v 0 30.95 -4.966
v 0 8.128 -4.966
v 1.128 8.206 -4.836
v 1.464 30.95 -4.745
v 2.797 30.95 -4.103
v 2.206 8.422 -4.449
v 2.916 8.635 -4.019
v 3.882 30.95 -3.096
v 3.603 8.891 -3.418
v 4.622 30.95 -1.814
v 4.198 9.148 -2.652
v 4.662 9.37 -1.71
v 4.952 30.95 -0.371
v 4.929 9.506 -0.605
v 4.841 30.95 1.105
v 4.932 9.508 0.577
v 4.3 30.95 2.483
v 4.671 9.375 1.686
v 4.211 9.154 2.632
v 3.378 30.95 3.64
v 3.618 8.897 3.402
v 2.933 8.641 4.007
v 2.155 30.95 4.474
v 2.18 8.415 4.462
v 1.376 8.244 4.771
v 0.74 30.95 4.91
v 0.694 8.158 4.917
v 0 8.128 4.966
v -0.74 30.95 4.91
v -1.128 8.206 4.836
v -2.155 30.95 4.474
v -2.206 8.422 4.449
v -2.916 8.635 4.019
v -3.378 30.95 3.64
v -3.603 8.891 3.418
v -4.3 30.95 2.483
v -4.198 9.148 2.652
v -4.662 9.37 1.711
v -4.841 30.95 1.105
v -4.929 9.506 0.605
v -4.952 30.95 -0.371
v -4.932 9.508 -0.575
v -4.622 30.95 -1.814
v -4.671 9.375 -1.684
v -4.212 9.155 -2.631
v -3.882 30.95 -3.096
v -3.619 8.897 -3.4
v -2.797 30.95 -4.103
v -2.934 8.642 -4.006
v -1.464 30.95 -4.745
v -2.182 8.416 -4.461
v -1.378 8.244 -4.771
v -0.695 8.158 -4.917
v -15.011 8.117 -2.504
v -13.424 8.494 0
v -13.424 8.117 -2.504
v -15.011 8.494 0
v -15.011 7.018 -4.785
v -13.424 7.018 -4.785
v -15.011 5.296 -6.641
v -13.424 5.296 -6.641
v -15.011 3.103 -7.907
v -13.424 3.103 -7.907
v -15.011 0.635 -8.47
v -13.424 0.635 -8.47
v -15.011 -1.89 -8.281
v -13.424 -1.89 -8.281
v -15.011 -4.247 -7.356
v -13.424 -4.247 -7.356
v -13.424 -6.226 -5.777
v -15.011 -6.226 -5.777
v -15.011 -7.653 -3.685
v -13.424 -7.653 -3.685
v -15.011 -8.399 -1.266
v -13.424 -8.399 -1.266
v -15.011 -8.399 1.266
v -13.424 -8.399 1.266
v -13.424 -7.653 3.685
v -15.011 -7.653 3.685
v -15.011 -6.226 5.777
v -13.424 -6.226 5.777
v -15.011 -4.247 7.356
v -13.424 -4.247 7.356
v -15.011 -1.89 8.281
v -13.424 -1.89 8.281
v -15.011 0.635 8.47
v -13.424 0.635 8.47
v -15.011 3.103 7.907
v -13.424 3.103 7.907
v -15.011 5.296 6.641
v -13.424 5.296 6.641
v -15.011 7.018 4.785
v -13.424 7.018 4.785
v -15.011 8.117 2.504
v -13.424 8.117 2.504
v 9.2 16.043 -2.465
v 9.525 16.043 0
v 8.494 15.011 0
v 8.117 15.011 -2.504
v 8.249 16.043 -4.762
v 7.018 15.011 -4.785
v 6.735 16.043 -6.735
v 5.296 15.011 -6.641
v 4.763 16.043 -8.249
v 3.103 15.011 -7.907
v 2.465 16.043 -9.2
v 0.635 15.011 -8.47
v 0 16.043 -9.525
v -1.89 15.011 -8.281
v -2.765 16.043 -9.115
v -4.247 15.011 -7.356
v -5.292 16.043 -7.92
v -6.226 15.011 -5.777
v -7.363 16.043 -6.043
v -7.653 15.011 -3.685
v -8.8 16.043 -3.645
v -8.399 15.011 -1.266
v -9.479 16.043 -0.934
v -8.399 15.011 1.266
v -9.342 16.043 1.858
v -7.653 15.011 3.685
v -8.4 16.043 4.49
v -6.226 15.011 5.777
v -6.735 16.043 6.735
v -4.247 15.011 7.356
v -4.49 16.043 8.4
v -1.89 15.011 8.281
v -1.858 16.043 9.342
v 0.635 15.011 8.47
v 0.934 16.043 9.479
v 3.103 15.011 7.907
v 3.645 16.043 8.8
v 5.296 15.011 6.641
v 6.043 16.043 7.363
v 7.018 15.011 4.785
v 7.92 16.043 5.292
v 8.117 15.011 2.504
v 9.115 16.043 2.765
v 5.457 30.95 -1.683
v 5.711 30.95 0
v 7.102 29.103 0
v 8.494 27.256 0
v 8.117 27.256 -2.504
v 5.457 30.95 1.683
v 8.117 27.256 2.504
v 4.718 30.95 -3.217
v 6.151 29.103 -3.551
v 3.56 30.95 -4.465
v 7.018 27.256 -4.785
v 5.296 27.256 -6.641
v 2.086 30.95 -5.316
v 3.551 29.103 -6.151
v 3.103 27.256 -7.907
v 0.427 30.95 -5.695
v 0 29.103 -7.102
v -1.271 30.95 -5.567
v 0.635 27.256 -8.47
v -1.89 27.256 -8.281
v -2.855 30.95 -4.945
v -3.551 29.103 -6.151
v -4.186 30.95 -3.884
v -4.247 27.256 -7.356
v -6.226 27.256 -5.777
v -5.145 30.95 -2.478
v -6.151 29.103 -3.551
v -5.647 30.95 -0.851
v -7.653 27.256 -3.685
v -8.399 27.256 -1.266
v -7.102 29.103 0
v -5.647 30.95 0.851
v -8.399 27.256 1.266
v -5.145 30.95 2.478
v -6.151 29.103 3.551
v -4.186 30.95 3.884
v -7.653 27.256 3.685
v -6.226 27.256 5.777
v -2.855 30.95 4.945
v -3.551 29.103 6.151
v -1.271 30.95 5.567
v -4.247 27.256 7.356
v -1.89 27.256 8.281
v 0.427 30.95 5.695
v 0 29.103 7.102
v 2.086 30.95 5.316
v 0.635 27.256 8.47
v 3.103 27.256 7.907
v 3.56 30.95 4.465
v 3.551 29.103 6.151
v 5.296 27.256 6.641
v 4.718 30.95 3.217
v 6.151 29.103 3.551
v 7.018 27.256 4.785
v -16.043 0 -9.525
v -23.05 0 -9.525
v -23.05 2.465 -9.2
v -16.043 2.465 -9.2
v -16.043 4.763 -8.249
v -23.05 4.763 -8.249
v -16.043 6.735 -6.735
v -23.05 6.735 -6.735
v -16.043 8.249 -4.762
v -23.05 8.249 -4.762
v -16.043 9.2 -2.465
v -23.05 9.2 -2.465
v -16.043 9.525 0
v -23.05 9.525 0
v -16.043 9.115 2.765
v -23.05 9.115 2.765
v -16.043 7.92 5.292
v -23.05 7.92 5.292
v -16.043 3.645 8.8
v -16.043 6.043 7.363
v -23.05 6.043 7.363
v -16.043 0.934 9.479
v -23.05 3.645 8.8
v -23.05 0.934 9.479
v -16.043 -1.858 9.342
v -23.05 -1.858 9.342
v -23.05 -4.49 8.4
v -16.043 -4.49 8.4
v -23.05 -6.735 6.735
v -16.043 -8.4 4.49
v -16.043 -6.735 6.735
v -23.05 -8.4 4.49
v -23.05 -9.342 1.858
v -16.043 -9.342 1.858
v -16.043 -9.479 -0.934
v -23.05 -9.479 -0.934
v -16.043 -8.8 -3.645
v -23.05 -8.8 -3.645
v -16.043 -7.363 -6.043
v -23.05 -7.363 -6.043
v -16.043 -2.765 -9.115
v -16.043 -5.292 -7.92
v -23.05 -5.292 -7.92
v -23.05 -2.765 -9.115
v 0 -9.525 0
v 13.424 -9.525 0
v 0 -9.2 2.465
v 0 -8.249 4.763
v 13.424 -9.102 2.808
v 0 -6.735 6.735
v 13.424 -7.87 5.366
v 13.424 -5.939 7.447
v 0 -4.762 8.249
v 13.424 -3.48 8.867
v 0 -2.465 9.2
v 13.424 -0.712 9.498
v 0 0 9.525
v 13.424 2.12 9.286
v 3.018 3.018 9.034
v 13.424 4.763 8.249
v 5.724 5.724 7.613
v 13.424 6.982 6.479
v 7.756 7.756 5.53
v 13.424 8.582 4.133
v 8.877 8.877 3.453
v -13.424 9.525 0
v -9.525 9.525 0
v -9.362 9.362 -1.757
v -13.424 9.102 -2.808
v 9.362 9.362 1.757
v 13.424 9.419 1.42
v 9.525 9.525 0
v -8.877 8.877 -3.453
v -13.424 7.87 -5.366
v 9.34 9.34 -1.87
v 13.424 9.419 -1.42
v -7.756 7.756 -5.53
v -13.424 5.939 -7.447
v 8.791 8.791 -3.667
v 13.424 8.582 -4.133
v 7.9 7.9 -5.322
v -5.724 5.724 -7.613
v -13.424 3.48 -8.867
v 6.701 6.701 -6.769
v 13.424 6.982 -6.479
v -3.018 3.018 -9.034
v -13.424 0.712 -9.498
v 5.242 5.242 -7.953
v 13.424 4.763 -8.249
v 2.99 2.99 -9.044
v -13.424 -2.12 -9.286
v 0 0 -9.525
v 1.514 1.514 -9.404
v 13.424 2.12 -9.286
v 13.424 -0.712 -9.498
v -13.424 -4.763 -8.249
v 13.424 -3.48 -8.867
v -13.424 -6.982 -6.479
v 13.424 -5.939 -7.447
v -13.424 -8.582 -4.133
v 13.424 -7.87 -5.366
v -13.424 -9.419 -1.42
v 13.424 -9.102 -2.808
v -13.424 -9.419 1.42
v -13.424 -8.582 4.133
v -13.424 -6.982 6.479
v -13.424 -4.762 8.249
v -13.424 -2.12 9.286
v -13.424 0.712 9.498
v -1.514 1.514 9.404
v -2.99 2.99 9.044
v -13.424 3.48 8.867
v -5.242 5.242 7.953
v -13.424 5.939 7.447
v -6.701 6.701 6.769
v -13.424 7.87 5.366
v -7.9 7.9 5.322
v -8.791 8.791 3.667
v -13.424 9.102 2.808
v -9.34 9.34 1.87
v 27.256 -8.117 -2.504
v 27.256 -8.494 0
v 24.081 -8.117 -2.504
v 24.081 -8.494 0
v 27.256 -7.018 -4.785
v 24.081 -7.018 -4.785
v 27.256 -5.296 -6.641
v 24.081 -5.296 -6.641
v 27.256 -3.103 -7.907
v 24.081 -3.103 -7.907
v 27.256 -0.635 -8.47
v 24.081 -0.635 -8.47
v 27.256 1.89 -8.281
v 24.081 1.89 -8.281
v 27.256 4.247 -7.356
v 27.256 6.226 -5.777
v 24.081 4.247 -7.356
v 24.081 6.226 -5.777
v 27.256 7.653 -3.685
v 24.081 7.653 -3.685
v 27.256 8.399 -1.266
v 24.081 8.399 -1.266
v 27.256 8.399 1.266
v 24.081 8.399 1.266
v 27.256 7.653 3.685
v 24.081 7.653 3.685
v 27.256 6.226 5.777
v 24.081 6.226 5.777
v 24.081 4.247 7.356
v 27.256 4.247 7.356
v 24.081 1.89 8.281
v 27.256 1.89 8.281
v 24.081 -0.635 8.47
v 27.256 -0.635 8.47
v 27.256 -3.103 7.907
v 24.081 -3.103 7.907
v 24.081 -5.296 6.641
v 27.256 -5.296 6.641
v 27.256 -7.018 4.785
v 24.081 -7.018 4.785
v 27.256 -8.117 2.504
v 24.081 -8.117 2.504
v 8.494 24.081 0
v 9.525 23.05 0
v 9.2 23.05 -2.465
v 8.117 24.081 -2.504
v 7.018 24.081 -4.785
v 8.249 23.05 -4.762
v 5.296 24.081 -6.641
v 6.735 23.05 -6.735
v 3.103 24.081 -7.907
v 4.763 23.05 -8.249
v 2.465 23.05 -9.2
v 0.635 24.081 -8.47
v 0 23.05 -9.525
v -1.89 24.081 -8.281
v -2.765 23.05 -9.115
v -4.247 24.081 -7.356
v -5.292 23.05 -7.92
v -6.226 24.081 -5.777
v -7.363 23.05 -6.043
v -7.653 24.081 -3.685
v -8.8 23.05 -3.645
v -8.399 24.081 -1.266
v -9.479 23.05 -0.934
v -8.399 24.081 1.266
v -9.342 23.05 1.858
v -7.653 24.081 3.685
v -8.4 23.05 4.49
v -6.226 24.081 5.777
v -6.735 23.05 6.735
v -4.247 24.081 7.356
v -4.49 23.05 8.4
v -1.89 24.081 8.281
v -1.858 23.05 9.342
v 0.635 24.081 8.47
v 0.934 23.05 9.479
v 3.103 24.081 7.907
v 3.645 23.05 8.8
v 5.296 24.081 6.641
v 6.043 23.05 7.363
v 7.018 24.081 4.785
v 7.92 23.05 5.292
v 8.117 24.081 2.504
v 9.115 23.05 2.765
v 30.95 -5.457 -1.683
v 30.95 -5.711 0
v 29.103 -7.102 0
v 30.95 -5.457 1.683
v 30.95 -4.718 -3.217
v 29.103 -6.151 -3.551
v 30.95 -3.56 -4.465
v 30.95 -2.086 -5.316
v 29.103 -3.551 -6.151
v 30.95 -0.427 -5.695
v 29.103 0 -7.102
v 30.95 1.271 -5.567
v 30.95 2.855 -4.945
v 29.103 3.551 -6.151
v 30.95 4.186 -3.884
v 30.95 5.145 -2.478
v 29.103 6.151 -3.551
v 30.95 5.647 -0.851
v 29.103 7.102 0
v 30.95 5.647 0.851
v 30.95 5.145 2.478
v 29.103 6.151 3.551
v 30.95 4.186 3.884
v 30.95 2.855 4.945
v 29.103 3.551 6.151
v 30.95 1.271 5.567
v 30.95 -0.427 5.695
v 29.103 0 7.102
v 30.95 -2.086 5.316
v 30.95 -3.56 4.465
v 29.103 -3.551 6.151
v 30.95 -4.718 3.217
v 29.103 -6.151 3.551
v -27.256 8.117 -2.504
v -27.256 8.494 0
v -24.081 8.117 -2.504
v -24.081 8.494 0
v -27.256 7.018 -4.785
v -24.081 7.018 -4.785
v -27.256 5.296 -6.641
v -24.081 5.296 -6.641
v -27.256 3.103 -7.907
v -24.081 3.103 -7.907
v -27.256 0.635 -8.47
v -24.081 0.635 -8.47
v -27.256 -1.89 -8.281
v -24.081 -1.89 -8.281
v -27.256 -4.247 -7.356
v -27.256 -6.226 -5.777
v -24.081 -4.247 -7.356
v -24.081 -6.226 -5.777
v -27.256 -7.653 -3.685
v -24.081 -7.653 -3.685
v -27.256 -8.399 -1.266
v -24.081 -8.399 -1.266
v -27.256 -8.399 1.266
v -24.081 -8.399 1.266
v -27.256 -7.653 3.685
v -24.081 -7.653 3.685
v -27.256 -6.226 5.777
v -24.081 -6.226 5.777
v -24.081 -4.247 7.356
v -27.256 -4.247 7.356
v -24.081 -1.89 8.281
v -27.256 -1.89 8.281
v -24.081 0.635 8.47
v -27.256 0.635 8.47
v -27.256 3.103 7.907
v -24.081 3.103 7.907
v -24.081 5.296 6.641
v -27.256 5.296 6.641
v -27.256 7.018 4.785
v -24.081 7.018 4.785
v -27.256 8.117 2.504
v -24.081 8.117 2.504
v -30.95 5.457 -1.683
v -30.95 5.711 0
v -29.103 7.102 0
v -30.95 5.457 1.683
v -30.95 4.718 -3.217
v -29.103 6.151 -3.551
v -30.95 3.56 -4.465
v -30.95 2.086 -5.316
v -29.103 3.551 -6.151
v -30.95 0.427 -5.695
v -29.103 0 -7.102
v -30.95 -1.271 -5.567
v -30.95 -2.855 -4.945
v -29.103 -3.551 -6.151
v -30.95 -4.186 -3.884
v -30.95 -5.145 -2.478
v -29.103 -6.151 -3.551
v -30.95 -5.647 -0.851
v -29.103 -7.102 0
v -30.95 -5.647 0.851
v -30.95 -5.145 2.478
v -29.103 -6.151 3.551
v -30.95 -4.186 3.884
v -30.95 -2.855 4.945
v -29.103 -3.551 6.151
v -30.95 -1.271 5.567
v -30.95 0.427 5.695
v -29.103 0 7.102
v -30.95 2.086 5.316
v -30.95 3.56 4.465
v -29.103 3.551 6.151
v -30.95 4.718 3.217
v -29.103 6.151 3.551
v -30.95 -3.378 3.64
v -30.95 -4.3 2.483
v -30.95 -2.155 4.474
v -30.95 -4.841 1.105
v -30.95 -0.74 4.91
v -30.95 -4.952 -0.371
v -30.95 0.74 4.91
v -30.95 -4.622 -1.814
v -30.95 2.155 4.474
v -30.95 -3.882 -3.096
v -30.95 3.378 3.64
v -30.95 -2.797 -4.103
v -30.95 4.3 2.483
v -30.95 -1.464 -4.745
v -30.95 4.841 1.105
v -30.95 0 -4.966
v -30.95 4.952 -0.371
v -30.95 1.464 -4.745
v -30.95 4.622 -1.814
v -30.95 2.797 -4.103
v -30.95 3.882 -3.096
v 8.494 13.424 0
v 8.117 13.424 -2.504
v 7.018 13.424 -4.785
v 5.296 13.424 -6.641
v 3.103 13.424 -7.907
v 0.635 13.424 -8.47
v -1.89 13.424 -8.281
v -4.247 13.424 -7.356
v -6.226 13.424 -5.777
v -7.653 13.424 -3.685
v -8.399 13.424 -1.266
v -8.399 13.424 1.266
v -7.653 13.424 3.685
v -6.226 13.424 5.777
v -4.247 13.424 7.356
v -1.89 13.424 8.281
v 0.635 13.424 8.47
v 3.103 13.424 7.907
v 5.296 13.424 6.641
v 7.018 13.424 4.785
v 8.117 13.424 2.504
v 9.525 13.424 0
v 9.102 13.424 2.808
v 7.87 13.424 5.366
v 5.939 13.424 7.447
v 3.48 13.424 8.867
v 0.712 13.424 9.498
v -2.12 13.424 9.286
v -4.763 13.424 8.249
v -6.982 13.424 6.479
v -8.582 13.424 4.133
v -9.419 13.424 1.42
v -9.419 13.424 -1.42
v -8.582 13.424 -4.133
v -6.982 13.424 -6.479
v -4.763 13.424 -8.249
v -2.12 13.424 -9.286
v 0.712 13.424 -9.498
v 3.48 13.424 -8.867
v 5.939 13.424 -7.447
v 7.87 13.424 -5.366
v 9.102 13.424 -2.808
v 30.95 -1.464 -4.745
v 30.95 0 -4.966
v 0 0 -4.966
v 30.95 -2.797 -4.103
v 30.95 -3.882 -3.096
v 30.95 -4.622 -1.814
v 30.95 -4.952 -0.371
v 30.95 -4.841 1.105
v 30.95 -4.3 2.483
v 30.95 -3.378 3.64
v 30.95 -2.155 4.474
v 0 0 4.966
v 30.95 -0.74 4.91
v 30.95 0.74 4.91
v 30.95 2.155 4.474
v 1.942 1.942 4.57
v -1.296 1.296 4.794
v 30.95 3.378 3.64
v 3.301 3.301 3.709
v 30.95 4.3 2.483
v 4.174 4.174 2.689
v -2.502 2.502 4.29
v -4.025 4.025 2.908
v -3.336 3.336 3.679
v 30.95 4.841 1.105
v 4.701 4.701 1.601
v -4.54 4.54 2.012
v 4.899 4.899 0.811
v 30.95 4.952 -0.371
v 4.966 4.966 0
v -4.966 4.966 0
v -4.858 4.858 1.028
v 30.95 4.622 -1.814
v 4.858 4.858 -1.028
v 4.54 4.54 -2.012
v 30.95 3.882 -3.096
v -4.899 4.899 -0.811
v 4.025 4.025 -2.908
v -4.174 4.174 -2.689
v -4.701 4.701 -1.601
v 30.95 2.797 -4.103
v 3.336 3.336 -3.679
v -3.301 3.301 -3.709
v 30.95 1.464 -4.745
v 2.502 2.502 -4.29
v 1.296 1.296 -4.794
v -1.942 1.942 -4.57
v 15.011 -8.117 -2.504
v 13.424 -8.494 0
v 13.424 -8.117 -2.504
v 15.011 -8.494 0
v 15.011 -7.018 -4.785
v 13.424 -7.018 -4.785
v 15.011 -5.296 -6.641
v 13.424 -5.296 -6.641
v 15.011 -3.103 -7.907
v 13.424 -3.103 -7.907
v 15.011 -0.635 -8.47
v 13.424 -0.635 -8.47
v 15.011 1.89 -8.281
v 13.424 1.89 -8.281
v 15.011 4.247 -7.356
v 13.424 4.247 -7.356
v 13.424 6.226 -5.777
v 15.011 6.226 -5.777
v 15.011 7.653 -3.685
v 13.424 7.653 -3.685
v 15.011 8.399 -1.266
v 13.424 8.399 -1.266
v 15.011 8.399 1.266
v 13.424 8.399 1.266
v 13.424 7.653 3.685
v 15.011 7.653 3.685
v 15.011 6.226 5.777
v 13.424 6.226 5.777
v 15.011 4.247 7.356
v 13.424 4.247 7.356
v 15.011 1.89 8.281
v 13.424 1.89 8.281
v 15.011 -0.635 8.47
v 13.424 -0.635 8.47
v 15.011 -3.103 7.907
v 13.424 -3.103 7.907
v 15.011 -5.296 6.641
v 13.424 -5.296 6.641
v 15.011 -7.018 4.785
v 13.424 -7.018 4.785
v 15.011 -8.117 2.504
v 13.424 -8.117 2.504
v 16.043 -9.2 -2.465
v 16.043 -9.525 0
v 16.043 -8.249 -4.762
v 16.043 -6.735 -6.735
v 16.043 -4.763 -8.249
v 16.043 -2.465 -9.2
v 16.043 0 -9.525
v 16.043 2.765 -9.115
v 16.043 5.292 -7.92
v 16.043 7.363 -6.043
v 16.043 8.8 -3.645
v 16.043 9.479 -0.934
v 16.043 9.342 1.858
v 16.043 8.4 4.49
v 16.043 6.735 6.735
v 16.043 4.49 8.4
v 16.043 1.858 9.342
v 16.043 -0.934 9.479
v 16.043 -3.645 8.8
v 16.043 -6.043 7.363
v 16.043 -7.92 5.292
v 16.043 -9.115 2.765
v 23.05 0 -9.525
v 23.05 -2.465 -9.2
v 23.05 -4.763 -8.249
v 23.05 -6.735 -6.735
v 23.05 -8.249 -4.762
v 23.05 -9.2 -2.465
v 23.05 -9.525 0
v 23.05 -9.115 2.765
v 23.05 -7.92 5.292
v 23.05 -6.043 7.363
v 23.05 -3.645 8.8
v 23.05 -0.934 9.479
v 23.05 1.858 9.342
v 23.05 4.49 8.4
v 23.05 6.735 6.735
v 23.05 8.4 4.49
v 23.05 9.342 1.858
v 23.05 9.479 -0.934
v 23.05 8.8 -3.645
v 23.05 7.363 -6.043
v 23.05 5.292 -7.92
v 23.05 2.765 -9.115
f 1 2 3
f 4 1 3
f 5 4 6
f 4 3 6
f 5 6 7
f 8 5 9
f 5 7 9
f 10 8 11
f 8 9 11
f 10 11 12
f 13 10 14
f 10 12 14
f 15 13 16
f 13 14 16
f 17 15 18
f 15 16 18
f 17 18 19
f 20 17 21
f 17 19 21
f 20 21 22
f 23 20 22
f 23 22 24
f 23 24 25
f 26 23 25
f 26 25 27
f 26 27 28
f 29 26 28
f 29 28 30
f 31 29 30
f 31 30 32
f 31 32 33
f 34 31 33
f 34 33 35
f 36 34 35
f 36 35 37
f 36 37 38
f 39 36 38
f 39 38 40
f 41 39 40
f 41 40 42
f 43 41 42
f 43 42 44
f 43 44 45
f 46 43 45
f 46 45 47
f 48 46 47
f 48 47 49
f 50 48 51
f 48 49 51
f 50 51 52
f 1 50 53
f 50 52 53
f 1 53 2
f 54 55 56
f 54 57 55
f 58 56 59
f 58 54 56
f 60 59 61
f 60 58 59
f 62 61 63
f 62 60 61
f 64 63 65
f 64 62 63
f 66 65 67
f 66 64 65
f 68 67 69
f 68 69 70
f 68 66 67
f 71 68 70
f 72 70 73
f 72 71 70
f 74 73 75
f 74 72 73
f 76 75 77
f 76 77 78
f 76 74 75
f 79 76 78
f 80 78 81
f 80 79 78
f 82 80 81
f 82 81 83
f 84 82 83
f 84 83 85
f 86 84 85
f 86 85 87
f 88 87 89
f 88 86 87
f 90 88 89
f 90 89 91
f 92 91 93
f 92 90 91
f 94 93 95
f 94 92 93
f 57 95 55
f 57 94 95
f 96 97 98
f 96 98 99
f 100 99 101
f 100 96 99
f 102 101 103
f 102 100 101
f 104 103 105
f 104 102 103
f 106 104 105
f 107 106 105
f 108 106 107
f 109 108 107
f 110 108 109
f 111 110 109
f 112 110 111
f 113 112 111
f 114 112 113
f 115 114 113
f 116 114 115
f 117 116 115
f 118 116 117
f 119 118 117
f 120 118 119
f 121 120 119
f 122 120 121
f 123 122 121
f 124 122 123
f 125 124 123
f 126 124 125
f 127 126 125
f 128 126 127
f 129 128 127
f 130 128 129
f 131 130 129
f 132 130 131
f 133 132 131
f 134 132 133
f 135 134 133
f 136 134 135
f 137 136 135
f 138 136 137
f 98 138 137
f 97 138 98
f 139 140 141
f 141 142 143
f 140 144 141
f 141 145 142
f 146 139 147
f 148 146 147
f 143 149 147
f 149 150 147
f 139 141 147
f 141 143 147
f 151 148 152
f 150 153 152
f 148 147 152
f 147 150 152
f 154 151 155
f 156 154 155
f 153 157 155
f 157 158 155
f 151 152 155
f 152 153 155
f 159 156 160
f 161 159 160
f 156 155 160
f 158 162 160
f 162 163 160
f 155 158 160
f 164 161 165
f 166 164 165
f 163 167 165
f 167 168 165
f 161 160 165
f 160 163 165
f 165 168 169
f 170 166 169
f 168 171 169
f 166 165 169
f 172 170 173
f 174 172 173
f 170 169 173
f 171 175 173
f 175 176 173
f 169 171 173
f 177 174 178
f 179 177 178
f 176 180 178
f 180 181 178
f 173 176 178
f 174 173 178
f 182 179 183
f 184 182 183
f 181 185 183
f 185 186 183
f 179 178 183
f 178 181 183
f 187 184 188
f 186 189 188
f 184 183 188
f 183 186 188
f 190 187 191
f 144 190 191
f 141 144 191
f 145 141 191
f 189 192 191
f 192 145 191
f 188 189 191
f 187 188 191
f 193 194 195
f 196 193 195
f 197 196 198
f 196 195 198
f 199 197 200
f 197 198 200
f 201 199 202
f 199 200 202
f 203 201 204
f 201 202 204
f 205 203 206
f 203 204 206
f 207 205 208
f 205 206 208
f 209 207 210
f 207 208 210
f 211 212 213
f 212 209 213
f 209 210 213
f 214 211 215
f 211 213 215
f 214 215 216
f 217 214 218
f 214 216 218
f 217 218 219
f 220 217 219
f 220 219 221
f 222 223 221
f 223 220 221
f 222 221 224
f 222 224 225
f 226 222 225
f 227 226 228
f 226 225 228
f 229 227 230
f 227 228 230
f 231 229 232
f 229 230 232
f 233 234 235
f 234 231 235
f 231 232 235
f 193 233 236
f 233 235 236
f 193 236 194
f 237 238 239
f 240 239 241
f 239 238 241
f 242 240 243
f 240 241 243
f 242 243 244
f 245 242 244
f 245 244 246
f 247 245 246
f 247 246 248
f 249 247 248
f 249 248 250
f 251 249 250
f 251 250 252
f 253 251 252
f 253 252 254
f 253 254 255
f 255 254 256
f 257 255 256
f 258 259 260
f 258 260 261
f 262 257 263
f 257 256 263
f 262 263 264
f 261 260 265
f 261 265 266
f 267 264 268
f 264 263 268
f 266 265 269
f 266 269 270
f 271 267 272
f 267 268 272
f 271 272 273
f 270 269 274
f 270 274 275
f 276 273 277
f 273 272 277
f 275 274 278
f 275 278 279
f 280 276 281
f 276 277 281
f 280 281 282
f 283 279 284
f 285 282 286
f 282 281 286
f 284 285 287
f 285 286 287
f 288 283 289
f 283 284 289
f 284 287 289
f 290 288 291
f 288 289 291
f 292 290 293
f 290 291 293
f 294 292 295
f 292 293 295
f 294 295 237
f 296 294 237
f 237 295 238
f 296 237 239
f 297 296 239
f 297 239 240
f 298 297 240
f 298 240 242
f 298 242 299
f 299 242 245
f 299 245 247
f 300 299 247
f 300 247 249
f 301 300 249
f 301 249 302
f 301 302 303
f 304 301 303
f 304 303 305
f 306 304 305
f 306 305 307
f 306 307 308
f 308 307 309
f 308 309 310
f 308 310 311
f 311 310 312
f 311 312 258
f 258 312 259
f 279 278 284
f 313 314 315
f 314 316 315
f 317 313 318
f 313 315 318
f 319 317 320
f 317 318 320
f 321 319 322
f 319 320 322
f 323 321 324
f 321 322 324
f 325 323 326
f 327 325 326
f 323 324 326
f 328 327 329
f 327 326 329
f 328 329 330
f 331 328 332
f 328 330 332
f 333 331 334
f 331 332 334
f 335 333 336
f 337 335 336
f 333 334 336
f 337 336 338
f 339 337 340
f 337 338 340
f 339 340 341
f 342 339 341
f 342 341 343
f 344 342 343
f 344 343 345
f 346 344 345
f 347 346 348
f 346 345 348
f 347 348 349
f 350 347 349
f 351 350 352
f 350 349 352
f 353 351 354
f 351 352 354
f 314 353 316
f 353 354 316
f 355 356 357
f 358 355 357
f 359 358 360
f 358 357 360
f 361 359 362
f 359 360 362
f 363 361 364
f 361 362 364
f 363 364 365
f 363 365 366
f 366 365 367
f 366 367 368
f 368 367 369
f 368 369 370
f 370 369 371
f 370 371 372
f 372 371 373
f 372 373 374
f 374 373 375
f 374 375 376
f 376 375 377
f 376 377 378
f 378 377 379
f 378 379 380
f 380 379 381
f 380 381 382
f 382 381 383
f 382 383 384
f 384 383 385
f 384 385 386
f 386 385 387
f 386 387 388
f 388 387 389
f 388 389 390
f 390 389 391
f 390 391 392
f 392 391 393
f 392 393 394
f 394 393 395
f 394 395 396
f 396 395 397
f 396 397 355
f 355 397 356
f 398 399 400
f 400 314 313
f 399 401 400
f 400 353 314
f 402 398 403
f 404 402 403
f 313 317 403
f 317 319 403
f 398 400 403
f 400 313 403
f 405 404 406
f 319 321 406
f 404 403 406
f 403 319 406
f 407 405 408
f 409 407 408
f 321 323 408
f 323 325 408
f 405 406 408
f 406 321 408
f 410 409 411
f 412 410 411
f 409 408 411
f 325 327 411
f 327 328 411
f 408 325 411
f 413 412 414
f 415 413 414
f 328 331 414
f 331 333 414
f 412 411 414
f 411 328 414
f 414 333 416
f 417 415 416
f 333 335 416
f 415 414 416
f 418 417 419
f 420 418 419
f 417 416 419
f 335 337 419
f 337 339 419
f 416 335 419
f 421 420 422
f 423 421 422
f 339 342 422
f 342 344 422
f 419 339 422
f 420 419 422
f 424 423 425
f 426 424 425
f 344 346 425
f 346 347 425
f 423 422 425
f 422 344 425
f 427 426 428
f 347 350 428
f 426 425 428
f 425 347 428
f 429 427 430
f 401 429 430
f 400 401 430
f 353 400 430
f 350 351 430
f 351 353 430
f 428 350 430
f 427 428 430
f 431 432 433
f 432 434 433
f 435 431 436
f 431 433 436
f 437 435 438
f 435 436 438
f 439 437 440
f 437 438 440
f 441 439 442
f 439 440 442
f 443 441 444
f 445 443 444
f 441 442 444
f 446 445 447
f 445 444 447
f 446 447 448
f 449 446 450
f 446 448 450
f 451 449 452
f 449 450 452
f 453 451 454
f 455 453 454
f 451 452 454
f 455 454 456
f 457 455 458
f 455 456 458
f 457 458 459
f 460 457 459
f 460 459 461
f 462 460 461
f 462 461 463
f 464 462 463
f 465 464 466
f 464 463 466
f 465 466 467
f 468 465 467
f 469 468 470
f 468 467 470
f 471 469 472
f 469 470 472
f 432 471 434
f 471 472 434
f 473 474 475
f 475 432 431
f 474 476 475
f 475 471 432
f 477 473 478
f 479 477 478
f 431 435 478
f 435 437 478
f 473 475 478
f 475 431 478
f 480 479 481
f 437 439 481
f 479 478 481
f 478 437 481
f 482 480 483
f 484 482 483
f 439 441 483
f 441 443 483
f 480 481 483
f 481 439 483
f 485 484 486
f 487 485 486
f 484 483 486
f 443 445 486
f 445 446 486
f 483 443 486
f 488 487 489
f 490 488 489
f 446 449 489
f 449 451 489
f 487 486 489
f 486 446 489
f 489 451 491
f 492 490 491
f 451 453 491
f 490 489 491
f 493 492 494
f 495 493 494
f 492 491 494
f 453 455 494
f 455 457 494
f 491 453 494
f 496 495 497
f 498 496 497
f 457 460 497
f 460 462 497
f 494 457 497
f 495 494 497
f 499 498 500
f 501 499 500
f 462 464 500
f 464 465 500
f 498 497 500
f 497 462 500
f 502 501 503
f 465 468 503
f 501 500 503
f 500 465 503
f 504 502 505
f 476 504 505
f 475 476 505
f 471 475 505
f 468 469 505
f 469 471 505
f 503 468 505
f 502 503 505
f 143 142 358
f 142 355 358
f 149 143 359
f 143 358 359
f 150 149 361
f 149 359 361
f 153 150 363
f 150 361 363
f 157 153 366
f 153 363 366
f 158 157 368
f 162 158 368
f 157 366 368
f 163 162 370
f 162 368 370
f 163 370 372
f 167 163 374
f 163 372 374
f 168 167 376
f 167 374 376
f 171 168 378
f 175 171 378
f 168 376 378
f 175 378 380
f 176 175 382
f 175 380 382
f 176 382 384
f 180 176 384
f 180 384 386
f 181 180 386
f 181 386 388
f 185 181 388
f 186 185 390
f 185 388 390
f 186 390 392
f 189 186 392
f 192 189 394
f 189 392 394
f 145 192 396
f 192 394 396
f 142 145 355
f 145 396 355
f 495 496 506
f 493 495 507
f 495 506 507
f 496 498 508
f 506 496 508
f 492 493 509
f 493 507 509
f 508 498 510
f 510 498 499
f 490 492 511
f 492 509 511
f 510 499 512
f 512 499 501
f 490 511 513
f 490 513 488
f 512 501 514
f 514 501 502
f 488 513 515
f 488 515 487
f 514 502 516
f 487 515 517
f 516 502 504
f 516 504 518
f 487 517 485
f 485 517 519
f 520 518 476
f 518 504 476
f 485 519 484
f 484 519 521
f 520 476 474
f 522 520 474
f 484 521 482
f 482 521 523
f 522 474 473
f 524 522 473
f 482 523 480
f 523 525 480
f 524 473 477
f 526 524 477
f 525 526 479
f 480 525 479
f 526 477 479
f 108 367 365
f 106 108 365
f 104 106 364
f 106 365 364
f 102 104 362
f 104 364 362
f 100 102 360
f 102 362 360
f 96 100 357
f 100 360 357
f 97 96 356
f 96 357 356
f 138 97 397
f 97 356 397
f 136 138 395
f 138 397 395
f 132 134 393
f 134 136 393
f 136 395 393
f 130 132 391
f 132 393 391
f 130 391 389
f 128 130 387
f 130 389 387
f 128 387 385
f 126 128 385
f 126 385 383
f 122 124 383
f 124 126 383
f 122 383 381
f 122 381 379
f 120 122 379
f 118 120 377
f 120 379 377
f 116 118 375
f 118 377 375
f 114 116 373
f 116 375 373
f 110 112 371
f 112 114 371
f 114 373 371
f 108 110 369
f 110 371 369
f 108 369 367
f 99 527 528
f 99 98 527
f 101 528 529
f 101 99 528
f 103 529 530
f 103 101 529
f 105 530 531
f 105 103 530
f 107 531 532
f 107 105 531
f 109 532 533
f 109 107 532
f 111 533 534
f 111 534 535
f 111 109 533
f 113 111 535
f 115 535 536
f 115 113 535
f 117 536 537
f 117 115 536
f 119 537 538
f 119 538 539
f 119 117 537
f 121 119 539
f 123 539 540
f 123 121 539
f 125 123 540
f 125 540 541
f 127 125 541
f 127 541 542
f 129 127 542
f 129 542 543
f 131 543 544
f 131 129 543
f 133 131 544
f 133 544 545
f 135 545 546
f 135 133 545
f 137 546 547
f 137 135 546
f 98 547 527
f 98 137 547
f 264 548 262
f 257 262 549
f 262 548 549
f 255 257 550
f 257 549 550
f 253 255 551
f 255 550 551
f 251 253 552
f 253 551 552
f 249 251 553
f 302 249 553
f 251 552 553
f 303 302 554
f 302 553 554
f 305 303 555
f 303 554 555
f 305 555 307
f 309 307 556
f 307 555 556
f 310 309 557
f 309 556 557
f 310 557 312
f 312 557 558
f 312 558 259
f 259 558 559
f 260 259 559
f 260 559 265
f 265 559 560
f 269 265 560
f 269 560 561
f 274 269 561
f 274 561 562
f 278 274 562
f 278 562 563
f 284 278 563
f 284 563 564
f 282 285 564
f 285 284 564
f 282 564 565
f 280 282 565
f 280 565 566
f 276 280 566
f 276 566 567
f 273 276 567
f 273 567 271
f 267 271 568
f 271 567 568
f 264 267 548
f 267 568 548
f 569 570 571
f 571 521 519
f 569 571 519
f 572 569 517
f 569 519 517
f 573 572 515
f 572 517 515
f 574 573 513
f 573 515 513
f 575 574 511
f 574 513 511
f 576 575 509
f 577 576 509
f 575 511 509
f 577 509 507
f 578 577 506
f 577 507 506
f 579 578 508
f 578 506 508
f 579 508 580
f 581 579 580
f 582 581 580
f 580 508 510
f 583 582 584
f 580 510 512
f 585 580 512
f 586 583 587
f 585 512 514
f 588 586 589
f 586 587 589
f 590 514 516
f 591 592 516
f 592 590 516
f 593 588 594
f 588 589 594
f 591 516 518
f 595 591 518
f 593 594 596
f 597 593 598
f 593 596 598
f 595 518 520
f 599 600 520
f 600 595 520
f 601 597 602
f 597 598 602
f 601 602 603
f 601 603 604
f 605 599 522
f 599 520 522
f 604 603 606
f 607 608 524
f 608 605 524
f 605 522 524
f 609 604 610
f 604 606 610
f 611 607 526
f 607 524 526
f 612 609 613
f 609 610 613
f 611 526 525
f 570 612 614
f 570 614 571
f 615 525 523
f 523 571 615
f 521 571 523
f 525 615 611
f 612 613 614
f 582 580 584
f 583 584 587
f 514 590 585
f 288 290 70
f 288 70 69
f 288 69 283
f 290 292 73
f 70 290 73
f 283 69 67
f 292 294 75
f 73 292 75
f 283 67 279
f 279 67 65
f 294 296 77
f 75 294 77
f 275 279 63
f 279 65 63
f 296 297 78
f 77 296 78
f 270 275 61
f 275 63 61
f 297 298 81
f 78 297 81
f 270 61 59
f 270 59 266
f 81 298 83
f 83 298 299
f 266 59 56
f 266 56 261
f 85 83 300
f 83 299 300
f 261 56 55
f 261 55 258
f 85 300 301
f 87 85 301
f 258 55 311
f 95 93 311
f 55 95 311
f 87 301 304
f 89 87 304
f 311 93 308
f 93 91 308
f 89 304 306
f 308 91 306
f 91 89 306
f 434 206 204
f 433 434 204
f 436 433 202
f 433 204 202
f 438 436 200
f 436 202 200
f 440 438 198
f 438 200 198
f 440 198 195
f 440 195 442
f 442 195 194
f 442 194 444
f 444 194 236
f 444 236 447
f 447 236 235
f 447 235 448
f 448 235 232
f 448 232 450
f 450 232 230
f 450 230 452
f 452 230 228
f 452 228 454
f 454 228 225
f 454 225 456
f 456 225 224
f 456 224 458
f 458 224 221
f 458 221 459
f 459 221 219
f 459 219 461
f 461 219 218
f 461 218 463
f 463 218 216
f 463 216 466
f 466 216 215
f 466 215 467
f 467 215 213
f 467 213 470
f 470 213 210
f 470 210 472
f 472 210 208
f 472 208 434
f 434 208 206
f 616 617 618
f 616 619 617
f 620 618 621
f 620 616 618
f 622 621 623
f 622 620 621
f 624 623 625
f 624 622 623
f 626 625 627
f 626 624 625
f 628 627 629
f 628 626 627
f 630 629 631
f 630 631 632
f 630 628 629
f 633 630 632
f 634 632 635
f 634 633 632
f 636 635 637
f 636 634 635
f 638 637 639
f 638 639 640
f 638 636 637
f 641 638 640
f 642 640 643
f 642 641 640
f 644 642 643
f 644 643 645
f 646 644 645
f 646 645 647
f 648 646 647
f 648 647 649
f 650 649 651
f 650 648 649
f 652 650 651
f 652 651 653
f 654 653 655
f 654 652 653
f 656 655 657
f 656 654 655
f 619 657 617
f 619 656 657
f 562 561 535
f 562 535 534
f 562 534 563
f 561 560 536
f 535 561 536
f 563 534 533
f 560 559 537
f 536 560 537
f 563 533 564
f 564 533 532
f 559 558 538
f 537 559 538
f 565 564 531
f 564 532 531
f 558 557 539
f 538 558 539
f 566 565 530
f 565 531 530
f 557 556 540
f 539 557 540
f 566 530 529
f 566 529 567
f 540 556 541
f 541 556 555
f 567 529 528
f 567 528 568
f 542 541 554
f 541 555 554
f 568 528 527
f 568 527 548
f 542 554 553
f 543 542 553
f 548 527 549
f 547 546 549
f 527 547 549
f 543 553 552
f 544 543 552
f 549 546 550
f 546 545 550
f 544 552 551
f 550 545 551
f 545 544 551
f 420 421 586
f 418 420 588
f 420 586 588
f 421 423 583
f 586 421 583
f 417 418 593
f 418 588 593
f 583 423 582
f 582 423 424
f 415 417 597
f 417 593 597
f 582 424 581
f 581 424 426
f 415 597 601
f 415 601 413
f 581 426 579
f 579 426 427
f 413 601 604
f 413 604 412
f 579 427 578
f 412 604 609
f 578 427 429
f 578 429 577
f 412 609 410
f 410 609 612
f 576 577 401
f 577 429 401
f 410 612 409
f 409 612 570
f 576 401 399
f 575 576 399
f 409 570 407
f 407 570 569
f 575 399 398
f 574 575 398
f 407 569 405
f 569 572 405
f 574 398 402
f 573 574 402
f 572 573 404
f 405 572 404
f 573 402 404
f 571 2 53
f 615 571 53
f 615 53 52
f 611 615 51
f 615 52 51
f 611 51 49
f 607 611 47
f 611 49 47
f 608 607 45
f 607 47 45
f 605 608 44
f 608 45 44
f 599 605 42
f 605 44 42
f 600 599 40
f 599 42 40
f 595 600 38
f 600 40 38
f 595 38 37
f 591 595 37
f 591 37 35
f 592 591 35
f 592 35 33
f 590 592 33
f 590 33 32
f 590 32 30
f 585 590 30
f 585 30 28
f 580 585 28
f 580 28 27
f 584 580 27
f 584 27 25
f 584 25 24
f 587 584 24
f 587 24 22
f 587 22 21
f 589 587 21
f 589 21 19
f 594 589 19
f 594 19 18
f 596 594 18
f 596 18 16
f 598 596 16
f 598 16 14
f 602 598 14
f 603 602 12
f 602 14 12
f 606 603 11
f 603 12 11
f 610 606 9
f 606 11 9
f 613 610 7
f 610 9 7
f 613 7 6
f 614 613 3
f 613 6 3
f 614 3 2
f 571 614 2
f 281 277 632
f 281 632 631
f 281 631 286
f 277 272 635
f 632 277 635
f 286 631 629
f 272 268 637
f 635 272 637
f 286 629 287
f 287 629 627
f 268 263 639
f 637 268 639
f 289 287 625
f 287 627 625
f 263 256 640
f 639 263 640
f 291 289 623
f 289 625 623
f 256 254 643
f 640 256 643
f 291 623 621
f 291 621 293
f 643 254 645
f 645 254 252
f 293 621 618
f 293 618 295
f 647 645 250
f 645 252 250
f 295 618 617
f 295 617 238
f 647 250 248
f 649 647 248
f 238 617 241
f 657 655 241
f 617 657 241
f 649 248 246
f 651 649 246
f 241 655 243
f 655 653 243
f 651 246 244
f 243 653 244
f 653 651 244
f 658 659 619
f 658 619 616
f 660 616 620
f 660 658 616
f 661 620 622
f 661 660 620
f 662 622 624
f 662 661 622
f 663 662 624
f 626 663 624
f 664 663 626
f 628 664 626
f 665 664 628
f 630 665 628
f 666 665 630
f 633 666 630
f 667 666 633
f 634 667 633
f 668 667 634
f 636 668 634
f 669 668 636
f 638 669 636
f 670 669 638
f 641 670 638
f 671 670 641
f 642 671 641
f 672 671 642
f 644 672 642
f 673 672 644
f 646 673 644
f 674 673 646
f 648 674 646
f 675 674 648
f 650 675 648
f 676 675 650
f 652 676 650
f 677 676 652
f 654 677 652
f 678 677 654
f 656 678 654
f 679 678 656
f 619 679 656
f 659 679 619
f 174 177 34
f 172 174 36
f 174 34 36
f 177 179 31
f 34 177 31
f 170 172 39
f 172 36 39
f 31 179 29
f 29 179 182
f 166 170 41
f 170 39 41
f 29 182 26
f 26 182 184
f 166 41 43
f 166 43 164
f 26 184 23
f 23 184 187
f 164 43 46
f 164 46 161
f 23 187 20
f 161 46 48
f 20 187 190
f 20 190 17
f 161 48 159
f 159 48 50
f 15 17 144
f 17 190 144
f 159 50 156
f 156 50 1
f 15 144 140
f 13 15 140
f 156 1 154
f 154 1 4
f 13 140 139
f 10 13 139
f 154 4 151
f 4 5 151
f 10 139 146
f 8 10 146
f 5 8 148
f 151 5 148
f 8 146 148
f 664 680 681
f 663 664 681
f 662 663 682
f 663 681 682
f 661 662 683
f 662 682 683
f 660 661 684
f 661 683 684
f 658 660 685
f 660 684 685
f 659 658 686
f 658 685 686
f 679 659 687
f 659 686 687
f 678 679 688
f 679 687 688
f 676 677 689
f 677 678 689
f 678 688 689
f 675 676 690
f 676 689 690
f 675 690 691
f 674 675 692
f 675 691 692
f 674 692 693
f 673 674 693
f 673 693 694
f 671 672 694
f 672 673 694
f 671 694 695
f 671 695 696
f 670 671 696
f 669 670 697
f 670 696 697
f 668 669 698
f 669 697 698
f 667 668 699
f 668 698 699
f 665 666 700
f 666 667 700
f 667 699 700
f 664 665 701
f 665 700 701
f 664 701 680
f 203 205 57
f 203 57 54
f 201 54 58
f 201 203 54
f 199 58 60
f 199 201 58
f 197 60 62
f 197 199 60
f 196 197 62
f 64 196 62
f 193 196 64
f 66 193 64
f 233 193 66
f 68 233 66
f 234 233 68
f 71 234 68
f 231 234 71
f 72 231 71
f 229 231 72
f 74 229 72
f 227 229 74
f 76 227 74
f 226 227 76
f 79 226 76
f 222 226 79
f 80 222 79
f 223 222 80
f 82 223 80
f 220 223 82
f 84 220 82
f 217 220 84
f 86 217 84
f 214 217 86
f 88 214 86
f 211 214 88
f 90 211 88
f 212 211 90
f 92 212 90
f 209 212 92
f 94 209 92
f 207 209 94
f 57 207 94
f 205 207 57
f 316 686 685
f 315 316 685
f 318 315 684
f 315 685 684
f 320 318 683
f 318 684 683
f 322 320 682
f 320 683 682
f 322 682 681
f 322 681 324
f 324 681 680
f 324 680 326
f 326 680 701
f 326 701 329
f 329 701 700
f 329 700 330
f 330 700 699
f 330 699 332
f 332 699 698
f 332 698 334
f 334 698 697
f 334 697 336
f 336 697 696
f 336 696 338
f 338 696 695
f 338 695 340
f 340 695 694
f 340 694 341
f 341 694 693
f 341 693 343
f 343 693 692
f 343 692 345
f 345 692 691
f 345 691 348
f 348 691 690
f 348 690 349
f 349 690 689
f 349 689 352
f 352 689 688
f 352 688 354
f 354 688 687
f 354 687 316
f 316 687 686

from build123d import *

# Parameters (mm, degrees)
SKETCH2_R           = 9.525
EXTRUDE1_DEPTH      = 17.526
SKETCH15_R          = 9.525
BOSS_EXTRUDE1_DEPTH = 13.4239
SKETCH16_R          = 4.9657
CUT_EXTRUDE1_DEPTH  = 34.754222847
CIRPATTERN1_COUNT   = 3
CIRPATTERN1_ANGLE   = 180
SKETCH17_R          = 4.9657
CUT_EXTRUDE2_DEPTH  = 70.858479622
CUT_EXTRUDE3_REACH  = 53.835
SKETCH18_R          = 4.9657


with BuildPart() as part:
    # Sketch2 → Extrude1 (new body)
    with BuildSketch(Plane(origin=(-30.9499, 0, 0), x_dir=(0, 0, -1), z_dir=(1, 0, 0))):
        Circle(SKETCH2_R)
    extrude(amount=EXTRUDE1_DEPTH)

    # Sketch5 → Cut-Revolve1 (revolve, cut)
    with BuildSketch(Plane.XY):
        Polygon((-27.256291687, 8.493888504), (-24.081291687, 8.493888504), (-23.050180191, 9.525), (-30.9499, 9.525), (-30.9499, 5.710555), align=None)
        Polygon((-13.4239, 8.493888504), (-15.0114, 8.493888504), (-16.042511496, 9.525), (-13.4239, 9.525), align=None)
    revolve(axis=Axis((0, 0, 0), (-1, 0, 0)), mode=Mode.SUBTRACT)

    # Sketch15 → Boss-Extrude1 (add)
    with BuildSketch(Plane(origin=(-13.4239, 0, 0), x_dir=(0, 0, -1), z_dir=(1, 0, 0))):
        with Locations(Location((0, 0, 0), (0, 0, 90))):
            Circle(SKETCH15_R)
    extrude(amount=BOSS_EXTRUDE1_DEPTH)

    # Sketch16 → Cut-Extrude1 (cut, through all)
    with BuildSketch(Plane(origin=(0, 0, 0), x_dir=(0, 0, -1), z_dir=(1, 0, 0))):
        Circle(SKETCH16_R)
    extrude(amount=-CUT_EXTRUDE1_DEPTH, mode=Mode.SUBTRACT)


with BuildPart() as cirpattern1_1:
    # CirPattern1: pattern copy
    add(part.part.rotate(Axis((0, 0, 0), (0, 0, -1)), 1 * CIRPATTERN1_ANGLE / (CIRPATTERN1_COUNT - 1)))

    # Sketch17 → Cut-Extrude2 (cut, through all)
    with BuildSketch(Plane.ZY.offset(30.9499)):
        with Locations(Location((0, 0, 0), (0, 0, 180))):
            Circle(SKETCH17_R)
    extrude(amount=-CUT_EXTRUDE2_DEPTH, mode=Mode.SUBTRACT)


with BuildPart() as cirpattern1_2:
    # CirPattern1: pattern copy
    add(part.part.rotate(Axis((0, 0, 0), (0, 0, -1)), 2 * CIRPATTERN1_ANGLE / (CIRPATTERN1_COUNT - 1)))


with BuildPart() as cirpattern1_1_1:
    add(cirpattern1_1.part)

    # Combine1: union part, CirPattern1_2
    add(part.part)
    add(cirpattern1_2.part)

    # Sketch18 → Cut-Extrude3 (cut, up to next)
    with BuildSketch(Plane(origin=(0, 30.9499, 0), x_dir=(1, 0, 0), z_dir=(0, 1, 0)), mode=Mode.PRIVATE) as cut_extrude3_sk1:
        with Locations(Location((0, 0, 0), (0, 0, 90))):
            Circle(SKETCH18_R)
    cut_extrude3_tool1 = extrude(cut_extrude3_sk1.sketch, amount=-CUT_EXTRUDE3_REACH, mode=Mode.PRIVATE) & cirpattern1_1_1.part
    add(cut_extrude3_tool1.solids().sort_by_distance((0, 30.9499, 0))[0], mode=Mode.SUBTRACT)


solid = cirpattern1_1_1.part
